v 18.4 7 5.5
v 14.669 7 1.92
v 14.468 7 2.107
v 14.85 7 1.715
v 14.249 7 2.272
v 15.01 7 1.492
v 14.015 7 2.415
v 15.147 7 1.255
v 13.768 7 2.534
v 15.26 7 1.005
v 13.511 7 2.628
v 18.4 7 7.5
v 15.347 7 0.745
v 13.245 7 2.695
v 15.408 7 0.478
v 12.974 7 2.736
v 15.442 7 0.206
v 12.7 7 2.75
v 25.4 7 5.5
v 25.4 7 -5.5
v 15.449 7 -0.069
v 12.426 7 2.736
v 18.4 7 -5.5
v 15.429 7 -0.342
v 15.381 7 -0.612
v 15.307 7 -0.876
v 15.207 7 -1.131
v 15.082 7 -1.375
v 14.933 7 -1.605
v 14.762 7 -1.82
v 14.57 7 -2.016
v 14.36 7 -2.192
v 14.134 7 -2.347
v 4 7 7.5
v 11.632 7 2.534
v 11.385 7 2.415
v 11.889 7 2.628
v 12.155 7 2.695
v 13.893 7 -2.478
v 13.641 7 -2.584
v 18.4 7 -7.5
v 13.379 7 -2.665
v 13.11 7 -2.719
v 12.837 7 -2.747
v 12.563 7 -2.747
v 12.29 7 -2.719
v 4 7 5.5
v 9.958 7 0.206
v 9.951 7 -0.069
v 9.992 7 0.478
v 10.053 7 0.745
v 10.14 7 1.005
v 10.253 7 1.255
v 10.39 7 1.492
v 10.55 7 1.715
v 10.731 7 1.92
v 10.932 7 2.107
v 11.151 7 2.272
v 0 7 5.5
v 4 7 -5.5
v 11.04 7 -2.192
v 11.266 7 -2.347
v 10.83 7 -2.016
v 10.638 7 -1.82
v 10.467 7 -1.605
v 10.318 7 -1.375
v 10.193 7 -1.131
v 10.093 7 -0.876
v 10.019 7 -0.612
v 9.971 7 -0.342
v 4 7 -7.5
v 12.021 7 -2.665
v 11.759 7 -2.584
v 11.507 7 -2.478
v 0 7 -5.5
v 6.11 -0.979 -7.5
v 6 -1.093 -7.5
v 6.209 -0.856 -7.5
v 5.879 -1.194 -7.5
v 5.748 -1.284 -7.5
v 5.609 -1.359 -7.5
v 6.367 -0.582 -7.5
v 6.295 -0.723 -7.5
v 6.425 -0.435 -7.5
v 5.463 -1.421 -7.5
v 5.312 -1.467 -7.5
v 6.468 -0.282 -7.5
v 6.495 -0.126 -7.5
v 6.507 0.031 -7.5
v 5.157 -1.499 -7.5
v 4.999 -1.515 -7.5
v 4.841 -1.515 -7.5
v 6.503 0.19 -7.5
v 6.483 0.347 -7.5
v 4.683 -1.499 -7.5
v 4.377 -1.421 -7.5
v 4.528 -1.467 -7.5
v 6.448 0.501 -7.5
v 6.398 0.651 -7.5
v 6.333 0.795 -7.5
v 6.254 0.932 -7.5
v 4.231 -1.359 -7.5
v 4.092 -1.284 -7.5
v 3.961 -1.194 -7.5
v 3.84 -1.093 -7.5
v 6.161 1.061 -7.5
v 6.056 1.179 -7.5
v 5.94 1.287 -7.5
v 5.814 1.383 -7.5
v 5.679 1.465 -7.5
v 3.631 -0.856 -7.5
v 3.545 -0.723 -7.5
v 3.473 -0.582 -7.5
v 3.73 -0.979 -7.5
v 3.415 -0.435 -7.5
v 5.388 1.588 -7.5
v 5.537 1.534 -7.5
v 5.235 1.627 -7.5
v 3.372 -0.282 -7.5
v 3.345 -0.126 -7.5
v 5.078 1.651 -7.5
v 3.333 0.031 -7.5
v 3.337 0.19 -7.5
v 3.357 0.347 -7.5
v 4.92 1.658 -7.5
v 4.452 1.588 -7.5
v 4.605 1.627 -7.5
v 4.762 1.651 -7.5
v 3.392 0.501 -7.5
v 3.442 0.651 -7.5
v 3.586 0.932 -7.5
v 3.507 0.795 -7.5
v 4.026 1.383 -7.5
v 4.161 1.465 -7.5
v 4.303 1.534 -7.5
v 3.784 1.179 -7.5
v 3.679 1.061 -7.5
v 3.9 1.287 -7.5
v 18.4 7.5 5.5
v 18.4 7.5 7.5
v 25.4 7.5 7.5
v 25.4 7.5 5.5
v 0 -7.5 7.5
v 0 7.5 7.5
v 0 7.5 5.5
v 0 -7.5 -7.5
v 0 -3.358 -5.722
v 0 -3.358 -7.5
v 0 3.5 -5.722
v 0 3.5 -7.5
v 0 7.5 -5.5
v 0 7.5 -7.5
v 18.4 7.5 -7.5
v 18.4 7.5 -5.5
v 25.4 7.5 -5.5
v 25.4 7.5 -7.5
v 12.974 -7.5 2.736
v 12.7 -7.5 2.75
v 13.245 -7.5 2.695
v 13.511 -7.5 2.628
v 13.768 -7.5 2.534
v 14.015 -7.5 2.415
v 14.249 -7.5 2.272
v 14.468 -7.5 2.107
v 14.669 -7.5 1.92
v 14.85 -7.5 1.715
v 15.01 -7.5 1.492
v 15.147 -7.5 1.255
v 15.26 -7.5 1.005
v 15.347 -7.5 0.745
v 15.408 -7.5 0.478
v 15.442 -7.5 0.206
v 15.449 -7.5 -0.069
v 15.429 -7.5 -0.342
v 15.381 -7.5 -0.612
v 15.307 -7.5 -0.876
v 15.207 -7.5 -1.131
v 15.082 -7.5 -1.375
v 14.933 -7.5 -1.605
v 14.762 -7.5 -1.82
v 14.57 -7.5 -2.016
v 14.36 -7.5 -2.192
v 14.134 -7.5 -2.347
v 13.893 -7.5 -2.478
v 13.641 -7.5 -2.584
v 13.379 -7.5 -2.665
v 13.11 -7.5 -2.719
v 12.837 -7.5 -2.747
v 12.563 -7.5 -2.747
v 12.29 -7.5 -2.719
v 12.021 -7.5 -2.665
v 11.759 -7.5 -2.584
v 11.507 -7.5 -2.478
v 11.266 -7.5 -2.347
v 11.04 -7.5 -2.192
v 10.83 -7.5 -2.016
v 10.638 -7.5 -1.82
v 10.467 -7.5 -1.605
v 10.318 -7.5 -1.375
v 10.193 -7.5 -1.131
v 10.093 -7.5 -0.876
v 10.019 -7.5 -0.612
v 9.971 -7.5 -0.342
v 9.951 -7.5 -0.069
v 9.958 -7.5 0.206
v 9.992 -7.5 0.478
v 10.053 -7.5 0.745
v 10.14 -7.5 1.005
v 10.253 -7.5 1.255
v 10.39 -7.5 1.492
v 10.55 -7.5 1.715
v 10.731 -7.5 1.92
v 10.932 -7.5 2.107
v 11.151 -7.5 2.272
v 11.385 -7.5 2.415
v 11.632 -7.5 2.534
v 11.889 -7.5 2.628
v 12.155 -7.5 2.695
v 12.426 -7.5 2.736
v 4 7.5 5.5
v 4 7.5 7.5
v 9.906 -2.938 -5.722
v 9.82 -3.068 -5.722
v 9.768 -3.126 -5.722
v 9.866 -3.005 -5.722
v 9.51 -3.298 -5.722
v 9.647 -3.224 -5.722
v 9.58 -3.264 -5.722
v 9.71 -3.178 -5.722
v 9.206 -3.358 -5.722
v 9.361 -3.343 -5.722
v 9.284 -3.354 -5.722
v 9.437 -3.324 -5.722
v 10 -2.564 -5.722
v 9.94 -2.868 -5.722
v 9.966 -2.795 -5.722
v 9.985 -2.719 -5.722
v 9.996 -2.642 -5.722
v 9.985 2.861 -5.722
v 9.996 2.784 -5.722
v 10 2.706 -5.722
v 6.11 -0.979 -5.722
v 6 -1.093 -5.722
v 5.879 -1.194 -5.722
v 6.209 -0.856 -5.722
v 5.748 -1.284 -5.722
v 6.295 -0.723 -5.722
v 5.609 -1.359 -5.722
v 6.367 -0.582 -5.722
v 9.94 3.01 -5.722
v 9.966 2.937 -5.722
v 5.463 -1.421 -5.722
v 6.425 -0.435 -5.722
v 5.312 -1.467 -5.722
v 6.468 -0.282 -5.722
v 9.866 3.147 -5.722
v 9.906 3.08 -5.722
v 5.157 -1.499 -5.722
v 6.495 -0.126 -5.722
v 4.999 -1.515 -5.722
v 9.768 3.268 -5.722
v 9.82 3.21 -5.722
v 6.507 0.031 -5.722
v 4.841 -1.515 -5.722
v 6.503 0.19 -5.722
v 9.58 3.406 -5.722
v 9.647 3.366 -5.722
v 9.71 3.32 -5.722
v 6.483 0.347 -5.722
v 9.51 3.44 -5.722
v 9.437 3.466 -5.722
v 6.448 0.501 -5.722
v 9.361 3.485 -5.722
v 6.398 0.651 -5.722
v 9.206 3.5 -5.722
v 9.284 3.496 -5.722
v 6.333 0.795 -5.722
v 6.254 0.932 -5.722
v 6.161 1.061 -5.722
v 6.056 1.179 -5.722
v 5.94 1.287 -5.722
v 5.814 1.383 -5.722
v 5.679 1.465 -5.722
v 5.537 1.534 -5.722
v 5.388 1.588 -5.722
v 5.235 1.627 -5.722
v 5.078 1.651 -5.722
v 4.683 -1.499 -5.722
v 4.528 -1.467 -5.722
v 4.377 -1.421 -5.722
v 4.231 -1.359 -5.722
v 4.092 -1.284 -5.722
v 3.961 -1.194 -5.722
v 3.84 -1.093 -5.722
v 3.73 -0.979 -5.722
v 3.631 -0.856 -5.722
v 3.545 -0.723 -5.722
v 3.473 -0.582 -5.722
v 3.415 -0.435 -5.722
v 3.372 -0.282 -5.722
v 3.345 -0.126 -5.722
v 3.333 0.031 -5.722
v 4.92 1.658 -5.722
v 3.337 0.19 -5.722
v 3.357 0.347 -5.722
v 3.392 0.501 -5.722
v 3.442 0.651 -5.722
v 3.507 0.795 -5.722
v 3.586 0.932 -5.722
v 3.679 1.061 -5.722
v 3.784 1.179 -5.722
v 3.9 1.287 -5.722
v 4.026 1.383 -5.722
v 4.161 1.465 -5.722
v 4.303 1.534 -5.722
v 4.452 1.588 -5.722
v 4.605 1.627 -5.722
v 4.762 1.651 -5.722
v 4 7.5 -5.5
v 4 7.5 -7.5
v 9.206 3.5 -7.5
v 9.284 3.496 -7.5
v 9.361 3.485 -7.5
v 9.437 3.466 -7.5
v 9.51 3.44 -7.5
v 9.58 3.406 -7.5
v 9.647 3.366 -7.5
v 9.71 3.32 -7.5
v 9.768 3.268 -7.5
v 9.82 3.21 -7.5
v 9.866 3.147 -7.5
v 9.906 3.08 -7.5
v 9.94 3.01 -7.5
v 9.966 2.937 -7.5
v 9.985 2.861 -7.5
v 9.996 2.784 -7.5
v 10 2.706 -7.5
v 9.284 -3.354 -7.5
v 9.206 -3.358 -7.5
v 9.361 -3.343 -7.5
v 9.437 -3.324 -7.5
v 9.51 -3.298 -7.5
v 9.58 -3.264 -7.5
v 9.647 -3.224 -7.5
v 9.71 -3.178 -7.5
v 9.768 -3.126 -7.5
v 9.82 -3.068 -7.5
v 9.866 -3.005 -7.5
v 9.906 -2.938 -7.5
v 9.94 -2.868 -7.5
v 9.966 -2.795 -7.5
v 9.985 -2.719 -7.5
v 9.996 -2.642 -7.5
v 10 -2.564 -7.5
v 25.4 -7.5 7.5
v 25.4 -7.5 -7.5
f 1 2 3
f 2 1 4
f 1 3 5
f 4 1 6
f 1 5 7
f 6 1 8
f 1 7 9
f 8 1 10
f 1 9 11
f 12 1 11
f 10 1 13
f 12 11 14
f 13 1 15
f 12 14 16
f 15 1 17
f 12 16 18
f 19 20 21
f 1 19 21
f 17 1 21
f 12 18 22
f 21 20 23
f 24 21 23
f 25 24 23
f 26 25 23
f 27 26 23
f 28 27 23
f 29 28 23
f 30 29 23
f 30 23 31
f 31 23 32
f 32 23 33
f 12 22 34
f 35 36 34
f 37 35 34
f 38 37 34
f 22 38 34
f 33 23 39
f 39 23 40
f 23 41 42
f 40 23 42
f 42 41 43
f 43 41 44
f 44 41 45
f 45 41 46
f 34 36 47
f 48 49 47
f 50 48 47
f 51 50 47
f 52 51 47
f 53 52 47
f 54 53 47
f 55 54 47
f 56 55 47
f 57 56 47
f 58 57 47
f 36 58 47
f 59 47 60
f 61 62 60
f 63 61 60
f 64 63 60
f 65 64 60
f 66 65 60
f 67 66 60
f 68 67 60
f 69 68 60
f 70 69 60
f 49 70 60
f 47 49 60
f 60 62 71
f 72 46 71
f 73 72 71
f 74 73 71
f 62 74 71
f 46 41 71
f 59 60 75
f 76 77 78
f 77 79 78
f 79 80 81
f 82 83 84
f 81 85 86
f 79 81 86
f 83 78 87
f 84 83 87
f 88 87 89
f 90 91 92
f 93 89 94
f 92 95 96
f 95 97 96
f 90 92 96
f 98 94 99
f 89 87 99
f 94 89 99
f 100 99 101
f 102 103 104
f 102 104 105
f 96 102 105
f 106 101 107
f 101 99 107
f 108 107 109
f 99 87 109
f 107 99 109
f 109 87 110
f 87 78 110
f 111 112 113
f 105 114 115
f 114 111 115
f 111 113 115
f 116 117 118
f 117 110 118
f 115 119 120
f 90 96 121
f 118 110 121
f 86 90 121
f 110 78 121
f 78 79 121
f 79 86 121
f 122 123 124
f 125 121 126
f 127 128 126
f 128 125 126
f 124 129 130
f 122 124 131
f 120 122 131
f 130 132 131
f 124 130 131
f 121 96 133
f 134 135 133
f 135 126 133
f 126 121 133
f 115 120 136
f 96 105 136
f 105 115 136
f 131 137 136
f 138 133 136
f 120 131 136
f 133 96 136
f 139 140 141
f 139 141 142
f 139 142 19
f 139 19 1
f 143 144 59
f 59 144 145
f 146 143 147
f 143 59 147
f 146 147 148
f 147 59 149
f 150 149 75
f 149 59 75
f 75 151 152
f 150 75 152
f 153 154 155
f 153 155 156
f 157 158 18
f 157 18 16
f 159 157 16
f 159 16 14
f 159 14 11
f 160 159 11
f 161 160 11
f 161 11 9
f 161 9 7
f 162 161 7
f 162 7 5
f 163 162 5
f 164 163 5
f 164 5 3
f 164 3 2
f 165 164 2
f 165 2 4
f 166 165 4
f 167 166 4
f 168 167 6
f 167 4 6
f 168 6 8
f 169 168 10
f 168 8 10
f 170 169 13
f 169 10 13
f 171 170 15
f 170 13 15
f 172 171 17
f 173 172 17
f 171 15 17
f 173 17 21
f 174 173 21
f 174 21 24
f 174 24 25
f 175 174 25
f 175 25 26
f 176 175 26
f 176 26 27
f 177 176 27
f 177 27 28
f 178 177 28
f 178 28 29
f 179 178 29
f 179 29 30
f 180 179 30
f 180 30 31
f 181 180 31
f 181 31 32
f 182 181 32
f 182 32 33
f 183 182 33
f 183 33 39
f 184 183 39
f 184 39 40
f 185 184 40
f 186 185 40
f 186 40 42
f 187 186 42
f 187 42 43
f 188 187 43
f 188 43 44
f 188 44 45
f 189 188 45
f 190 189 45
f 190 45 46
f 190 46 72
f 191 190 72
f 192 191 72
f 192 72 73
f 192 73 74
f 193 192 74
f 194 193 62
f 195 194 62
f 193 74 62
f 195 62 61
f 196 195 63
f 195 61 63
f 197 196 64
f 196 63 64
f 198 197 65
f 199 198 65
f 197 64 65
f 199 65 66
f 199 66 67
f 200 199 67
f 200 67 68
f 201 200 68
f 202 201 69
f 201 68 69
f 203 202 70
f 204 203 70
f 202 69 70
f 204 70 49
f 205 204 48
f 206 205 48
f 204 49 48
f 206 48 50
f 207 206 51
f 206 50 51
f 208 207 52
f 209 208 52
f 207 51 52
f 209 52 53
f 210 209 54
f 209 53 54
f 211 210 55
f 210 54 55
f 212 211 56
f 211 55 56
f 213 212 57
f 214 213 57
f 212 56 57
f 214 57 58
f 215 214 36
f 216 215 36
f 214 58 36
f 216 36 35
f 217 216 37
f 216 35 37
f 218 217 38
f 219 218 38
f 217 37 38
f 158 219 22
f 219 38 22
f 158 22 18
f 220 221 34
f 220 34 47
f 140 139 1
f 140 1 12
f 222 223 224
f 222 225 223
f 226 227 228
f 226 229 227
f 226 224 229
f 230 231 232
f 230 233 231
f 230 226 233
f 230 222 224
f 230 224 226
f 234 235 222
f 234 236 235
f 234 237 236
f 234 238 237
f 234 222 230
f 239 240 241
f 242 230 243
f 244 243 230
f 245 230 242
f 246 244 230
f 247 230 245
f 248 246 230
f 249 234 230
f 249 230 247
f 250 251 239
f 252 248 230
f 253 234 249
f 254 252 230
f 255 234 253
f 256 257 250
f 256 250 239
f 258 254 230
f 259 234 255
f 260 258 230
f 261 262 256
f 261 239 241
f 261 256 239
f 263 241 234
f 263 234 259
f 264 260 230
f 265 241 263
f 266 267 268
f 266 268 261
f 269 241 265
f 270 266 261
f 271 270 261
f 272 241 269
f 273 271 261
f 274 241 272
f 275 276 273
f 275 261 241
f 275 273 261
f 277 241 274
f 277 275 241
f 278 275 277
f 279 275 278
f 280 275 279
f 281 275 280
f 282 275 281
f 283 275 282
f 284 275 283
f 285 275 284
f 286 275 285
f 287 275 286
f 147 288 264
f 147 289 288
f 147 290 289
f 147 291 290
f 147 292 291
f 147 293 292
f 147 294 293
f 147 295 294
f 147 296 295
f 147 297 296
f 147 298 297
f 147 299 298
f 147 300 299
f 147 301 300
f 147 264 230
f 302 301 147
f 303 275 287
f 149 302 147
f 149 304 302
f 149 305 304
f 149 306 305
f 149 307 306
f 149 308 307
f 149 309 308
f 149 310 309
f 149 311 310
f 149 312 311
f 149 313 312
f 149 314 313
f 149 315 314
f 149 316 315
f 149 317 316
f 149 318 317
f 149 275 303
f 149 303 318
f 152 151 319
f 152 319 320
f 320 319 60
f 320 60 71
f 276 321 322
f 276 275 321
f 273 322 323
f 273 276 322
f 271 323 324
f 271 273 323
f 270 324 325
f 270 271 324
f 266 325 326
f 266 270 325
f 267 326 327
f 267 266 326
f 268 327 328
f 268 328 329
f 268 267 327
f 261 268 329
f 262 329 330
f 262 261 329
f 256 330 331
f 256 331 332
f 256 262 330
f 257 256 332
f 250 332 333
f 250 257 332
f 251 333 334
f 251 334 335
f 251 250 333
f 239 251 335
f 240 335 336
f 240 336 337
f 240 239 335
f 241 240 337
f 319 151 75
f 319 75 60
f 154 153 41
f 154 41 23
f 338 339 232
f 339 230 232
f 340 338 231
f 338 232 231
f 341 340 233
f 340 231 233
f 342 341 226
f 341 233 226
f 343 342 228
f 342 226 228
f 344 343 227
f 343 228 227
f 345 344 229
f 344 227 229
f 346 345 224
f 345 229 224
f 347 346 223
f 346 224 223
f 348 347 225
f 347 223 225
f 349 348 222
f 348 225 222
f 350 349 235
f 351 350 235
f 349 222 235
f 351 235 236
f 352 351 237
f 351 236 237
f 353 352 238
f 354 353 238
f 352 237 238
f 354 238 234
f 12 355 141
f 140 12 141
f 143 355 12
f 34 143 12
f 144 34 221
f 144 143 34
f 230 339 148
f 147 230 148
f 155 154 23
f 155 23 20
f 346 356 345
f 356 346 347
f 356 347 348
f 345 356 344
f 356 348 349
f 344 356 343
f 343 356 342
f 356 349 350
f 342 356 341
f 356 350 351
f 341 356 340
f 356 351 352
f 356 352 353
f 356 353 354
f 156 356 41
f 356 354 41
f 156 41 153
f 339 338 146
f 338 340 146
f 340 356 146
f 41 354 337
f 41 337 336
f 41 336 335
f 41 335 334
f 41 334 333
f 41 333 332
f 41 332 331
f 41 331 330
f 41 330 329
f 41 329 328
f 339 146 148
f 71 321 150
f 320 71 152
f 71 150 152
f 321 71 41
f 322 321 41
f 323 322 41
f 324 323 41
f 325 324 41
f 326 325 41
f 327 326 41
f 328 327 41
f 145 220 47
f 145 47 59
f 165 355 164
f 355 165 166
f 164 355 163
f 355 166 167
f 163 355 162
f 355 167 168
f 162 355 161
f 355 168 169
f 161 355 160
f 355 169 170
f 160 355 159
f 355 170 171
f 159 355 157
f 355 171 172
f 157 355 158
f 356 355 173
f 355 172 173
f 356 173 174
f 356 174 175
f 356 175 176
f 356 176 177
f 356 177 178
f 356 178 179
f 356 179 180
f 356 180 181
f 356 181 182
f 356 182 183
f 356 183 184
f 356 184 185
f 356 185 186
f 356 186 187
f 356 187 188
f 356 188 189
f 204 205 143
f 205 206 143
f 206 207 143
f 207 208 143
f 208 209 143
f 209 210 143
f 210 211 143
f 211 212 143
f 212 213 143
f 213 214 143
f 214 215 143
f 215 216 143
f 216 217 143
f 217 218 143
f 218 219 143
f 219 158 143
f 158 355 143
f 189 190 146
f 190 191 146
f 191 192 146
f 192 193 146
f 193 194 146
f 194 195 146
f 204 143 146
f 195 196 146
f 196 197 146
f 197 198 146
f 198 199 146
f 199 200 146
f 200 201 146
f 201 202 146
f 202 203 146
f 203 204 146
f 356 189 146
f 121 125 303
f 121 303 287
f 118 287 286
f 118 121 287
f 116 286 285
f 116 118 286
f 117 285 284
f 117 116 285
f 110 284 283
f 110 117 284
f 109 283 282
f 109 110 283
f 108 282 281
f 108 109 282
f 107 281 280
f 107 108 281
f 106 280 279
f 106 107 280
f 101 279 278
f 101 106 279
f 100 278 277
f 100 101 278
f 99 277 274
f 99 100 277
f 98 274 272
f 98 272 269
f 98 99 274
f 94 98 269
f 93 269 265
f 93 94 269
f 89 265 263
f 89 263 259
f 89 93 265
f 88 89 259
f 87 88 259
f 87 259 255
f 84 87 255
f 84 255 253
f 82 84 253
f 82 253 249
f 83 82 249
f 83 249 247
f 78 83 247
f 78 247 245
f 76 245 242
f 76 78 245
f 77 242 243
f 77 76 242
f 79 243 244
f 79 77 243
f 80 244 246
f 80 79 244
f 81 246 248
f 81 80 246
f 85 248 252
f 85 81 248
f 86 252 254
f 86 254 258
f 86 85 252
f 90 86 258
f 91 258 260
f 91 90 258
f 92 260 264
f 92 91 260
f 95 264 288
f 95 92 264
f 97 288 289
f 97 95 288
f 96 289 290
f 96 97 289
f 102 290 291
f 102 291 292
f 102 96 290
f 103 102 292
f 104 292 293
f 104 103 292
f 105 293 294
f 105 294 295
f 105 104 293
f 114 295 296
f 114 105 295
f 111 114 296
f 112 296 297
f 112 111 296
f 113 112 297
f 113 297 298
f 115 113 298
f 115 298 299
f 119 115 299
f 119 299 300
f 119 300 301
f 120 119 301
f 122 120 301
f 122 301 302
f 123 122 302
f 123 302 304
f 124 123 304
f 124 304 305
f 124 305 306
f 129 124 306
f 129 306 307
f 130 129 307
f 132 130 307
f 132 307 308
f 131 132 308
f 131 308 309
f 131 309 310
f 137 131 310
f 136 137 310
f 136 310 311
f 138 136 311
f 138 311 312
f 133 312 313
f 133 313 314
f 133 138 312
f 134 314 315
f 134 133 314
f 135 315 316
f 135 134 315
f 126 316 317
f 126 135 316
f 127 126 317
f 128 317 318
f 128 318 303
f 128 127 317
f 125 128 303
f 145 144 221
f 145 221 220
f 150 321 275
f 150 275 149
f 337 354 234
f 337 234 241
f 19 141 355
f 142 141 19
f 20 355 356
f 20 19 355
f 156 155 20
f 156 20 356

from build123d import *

# Parameters (mm, degrees)
SKETCH1_W           = 15
SKETCH1_H           = 15
BOSS_EXTRUDE1_DEPTH = 25.4
SKETCH2_R           = 2.75
CUT_EXTRUDE1_DEPTH  = 31.436984082
SKETCH3_W           = 10
SKETCH3_H           = 6.858
SKETCH3_R           = 1.5875
CUT_EXTRUDE2_DEPTH  = 1.778
FILLET1_R           = 0.79375
CUT_EXTRUDE3_DEPTH  = 0.5


with BuildPart() as part:
    # Sketch1 → Boss-Extrude1 (new body)
    with BuildSketch(Plane(origin=(0, 0, 0), x_dir=(0, 0, -1), z_dir=(1, 0, 0))):
        Rectangle(SKETCH1_W, SKETCH1_H)
    extrude(amount=BOSS_EXTRUDE1_DEPTH)

    # Sketch2 → Cut-Extrude1 (cut, through all)
    with BuildSketch(Plane(origin=(0, 7.5, 0), x_dir=(1, 0, 0), z_dir=(0, 1, 0))):
        with Locations(Location((12.7, 0, 0), (0, 0, 270))):
            Circle(SKETCH2_R)
    extrude(amount=-CUT_EXTRUDE1_DEPTH, mode=Mode.SUBTRACT)

    # Sketch3 → Cut-Extrude2 (cut)
    with BuildSketch(Plane(origin=(0, 0, -7.5), x_dir=(-1, 0, 0), z_dir=(0, 0, -1))):
        with Locations((-5, 0.071)):
            Rectangle(SKETCH3_W, SKETCH3_H)
        with Locations(Location((-4.92, 0.071, 0), (0, 0, 90))):
            Circle(SKETCH3_R, mode=Mode.SUBTRACT)
    extrude(amount=-CUT_EXTRUDE2_DEPTH, mode=Mode.SUBTRACT)

    # Fillet1
    fillet1_edges = [part.edges().sort_by_distance(p)[0] for p in [
        (10, -3.358, -6.611),
        (10, 3.5, -6.611),
    ]]
    fillet(fillet1_edges, radius=FILLET1_R)

    # Sketch7 → Cut-Extrude3 (cut)
    with BuildSketch(Plane(origin=(0, 7.5, 0), x_dir=(1, 0, 0), z_dir=(0, 1, 0))):
        Polygon((4, 7.5), (18.4, 7.5), (18.4, 5.5), (25.4, 5.5), (25.4, -5.5), (18.4, -5.5), (18.4, -7.5), (4, -7.5), (4, -5.5), (0, -5.5), (0, 5.5), (4, 5.5), align=None)
    extrude(amount=-CUT_EXTRUDE3_DEPTH, mode=Mode.SUBTRACT)


solid = part.part
